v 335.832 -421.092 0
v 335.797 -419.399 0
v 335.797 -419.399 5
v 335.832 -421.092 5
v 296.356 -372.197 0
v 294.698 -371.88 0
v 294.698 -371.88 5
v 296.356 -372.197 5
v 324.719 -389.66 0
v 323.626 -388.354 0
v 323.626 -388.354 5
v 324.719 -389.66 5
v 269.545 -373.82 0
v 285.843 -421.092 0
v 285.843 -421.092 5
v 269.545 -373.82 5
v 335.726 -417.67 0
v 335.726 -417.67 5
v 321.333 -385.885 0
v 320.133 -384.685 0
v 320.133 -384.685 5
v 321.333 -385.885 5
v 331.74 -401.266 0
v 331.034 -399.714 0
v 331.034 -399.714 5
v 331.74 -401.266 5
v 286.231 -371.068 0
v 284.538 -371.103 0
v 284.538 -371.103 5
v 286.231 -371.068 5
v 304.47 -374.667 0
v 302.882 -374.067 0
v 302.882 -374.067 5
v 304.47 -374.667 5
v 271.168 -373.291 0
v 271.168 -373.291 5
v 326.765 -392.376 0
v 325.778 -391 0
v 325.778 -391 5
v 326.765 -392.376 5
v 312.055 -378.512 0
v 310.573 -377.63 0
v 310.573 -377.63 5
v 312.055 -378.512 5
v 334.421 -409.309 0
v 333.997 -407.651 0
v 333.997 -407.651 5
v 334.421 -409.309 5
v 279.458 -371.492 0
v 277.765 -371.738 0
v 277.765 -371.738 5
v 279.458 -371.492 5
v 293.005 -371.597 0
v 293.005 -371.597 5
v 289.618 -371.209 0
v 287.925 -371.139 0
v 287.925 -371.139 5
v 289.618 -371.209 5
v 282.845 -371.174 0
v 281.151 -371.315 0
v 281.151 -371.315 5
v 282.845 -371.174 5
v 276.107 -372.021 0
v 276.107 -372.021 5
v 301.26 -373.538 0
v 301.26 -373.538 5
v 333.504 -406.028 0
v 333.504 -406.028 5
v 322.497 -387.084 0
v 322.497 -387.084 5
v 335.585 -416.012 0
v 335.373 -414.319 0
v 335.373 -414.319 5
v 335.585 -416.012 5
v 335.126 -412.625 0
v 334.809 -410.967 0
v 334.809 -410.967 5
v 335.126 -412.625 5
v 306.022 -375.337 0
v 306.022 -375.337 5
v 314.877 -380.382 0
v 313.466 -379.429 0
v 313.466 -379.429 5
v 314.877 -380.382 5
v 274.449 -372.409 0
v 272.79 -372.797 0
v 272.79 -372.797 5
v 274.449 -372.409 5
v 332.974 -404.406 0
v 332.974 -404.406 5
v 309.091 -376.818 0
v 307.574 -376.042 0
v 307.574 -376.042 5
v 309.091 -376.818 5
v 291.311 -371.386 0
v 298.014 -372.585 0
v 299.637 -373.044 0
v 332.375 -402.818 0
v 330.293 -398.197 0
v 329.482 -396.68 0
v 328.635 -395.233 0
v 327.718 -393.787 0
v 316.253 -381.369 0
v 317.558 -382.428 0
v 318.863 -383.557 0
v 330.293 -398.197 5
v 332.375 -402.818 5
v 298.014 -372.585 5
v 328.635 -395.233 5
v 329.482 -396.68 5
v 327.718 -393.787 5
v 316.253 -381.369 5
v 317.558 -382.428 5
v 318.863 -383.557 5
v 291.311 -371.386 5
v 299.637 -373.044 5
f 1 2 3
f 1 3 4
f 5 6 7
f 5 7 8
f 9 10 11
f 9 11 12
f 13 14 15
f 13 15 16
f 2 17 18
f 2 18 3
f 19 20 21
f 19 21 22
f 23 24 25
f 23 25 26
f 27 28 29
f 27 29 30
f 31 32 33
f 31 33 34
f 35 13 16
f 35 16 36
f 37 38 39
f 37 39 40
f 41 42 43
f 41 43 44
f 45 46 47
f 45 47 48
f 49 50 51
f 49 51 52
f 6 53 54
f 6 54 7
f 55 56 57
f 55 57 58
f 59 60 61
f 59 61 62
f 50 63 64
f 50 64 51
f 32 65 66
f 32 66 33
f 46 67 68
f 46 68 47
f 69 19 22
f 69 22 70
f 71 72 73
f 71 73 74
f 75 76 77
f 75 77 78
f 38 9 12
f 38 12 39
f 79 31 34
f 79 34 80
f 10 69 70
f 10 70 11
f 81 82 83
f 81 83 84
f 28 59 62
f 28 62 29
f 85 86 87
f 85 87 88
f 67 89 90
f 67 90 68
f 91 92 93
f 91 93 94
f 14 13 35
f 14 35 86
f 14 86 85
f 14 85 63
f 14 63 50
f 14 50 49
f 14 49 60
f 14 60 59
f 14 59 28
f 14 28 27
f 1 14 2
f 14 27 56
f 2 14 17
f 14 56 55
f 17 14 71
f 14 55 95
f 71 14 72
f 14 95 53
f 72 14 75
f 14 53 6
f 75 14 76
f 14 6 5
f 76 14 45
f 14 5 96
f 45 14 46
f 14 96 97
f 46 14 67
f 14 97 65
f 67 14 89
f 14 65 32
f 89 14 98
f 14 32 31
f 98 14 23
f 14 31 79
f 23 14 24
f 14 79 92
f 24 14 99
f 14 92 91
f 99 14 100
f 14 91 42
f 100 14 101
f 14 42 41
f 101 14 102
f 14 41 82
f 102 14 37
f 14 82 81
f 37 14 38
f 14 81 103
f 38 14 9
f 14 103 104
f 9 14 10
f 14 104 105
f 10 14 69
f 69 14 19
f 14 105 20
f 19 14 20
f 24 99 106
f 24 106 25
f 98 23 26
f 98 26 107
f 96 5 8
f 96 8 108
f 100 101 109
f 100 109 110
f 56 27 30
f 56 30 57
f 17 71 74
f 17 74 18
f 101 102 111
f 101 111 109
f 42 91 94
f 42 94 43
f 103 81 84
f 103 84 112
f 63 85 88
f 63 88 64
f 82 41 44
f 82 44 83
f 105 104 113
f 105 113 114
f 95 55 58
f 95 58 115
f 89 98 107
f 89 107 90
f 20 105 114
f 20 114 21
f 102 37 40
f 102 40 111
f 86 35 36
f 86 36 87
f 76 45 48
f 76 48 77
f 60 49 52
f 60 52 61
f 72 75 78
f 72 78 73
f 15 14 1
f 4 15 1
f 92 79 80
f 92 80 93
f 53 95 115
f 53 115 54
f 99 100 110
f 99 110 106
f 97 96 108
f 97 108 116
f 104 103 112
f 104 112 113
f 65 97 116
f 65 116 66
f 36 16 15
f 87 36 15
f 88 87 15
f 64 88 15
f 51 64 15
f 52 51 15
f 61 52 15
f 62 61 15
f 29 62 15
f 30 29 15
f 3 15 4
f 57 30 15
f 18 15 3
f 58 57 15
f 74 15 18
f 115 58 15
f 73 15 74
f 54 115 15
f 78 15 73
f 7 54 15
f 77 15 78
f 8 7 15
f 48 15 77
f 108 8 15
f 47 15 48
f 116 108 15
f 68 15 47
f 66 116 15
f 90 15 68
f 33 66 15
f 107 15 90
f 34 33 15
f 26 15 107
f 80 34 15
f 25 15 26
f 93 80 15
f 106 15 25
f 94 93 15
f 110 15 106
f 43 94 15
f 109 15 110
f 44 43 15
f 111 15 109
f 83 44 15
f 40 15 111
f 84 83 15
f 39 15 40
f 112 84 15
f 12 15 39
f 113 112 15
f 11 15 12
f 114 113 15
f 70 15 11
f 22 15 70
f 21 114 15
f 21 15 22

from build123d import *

# Parameters (mm, degrees)
PAD_DEPTH = 5


with BuildPart() as part:
    # Sketch006 → Pad (new body)
    with BuildSketch(Plane.XY):
        with BuildLine():
            add(Edge.make_bspline(
                [(285.84324, -421.092099), (335.83185, -421.092099)],
                knots=[0, 0, 141.7, 141.7], degree=1))
            add(Edge.make_bspline(
                [(335.796573, -419.398766), (335.83185, -421.092099)],
                knots=[0, 0, 4.801042, 4.801042], degree=1))
            add(Edge.make_bspline(
                [(335.726017, -417.670155), (335.796573, -419.398766)],
                knots=[0, 0, 4.90408, 4.90408], degree=1))
            add(Edge.make_bspline(
                [(335.584906, -416.012099), (335.726017, -417.670155)],
                knots=[0, 0, 4.716991, 4.716991], degree=1))
            add(Edge.make_bspline(
                [(335.373239, -414.318766), (335.584906, -416.012099)],
                knots=[0, 0, 4.837355, 4.837355], degree=1))
            add(Edge.make_bspline(
                [(335.126295, -412.625433), (335.373239, -414.318766)],
                knots=[0, 0, 4.850773, 4.850773], degree=1))
            add(Edge.make_bspline(
                [(334.808795, -410.967377), (335.126295, -412.625433)],
                knots=[0, 0, 4.785394, 4.785394], degree=1))
            add(Edge.make_bspline(
                [(334.420739, -409.309322), (334.808795, -410.967377)],
                knots=[0, 0, 4.827007, 4.827007], degree=1))
            add(Edge.make_bspline(
                [(333.997406, -407.651266), (334.420739, -409.309322)],
                knots=[0, 0, 4.850773, 4.850773], degree=1))
            add(Edge.make_bspline(
                [(333.503517, -406.028489), (333.997406, -407.651266)],
                knots=[0, 0, 4.808326, 4.808326], degree=1))
            add(Edge.make_bspline(
                [(332.974351, -404.405711), (333.503517, -406.028489)],
                knots=[0, 0, 4.838388, 4.838388], degree=1))
            add(Edge.make_bspline(
                [(332.374628, -402.818211), (332.974351, -404.405711)],
                knots=[0, 0, 4.810405, 4.810405], degree=1))
            add(Edge.make_bspline(
                [(331.739628, -401.265989), (332.374628, -402.818211)],
                knots=[0, 0, 4.753946, 4.753946], degree=1))
            add(Edge.make_bspline(
                [(331.034073, -399.713766), (331.739628, -401.265989)],
                knots=[0, 0, 4.833218, 4.833218], degree=1))
            add(Edge.make_bspline(
                [(330.293239, -398.196822), (331.034073, -399.713766)],
                knots=[0, 0, 4.785394, 4.785394], degree=1))
            add(Edge.make_bspline(
                [(329.481851, -396.679878), (330.293239, -398.196822)],
                knots=[0, 0, 4.876474, 4.876474], degree=1))
            add(Edge.make_bspline(
                [(328.635184, -395.233489), (329.481851, -396.679878)],
                knots=[0, 0, 4.750789, 4.750789], degree=1))
            add(Edge.make_bspline(
                [(327.717962, -393.7871), (328.635184, -395.233489)],
                knots=[0, 0, 4.854894, 4.854894], degree=1))
            add(Edge.make_bspline(
                [(326.765462, -392.375989), (327.717962, -393.7871)],
                knots=[0, 0, 4.825971, 4.825971], degree=1))
            add(Edge.make_bspline(
                [(325.777684, -391.000156), (326.765462, -392.375989)],
                knots=[0, 0, 4.801042, 4.801042], degree=1))
            add(Edge.make_bspline(
                [(324.719351, -389.6596), (325.777684, -391.000156)],
                knots=[0, 0, 4.841487, 4.841487], degree=1))
            add(Edge.make_bspline(
                [(323.62574, -388.354322), (324.719351, -389.6596)],
                knots=[0, 0, 4.827007, 4.827007], degree=1))
            add(Edge.make_bspline(
                [(322.496851, -387.084322), (323.62574, -388.354322)],
                knots=[0, 0, 4.816638, 4.816638], degree=1))
            add(Edge.make_bspline(
                [(321.332684, -385.884878), (322.496851, -387.084322)],
                knots=[0, 0, 4.738143, 4.738143], degree=1))
            add(Edge.make_bspline(
                [(320.13324, -384.685433), (321.332684, -385.884878)],
                knots=[0, 0, 4.808326, 4.808326], degree=1))
            add(Edge.make_bspline(
                [(318.86324, -383.556545), (320.13324, -384.685433)],
                knots=[0, 0, 4.816638, 4.816638], degree=1))
            add(Edge.make_bspline(
                [(317.557962, -382.427656), (318.86324, -383.556545)],
                knots=[0, 0, 4.89183, 4.89183], degree=1))
            add(Edge.make_bspline(
                [(316.252684, -381.369322), (317.557962, -382.427656)],
                knots=[0, 0, 4.763402, 4.763402], degree=1))
            add(Edge.make_bspline(
                [(314.876851, -380.381545), (316.252684, -381.369322)],
                knots=[0, 0, 4.801042, 4.801042], degree=1))
            add(Edge.make_bspline(
                [(313.46574, -379.429045), (314.876851, -380.381545)],
                knots=[0, 0, 4.825971, 4.825971], degree=1))
            add(Edge.make_bspline(
                [(312.054629, -378.511822), (313.46574, -379.429045)],
                knots=[0, 0, 4.770744, 4.770744], degree=1))
            add(Edge.make_bspline(
                [(310.572962, -377.629878), (312.054629, -378.511822)],
                knots=[0, 0, 4.88774, 4.88774], degree=1))
            add(Edge.make_bspline(
                [(309.091295, -376.818489), (310.572962, -377.629878)],
                knots=[0, 0, 4.788528, 4.788528], degree=1))
            add(Edge.make_bspline(
                [(307.574351, -376.042378), (309.091295, -376.818489)],
                knots=[0, 0, 4.830114, 4.830114], degree=1))
            add(Edge.make_bspline(
                [(306.022129, -375.336823), (307.574351, -376.042378)],
                knots=[0, 0, 4.833218, 4.833218], degree=1))
            add(Edge.make_bspline(
                [(304.469907, -374.666545), (306.022129, -375.336823)],
                knots=[0, 0, 4.792703, 4.792703], degree=1))
            add(Edge.make_bspline(
                [(302.882407, -374.066823), (304.469907, -374.666545)],
                knots=[0, 0, 4.810405, 4.810405], degree=1))
            add(Edge.make_bspline(
                [(301.259629, -373.537656), (302.882407, -374.066823)],
                knots=[0, 0, 4.838388, 4.838388], degree=1))
            add(Edge.make_bspline(
                [(299.636851, -373.043767), (301.259629, -373.537656)],
                knots=[0, 0, 4.808326, 4.808326], degree=1))
            add(Edge.make_bspline(
                [(298.014074, -372.585156), (299.636851, -373.043767)],
                knots=[0, 0, 4.780167, 4.780167], degree=1))
            add(Edge.make_bspline(
                [(296.356018, -372.1971), (298.014074, -372.585156)],
                knots=[0, 0, 4.827007, 4.827007], degree=1))
            add(Edge.make_bspline(
                [(294.697962, -371.8796), (296.356018, -372.1971)],
                knots=[0, 0, 4.785394, 4.785394], degree=1))
            add(Edge.make_bspline(
                [(293.004629, -371.597378), (294.697962, -371.8796)],
                knots=[0, 0, 4.86621, 4.86621], degree=1))
            add(Edge.make_bspline(
                [(291.311296, -371.385712), (293.004629, -371.597378)],
                knots=[0, 0, 4.837355, 4.837355], degree=1))
            add(Edge.make_bspline(
                [(289.617963, -371.209323), (291.311296, -371.385712)],
                knots=[0, 0, 4.825971, 4.825971], degree=1))
            add(Edge.make_bspline(
                [(287.924629, -371.138767), (289.617963, -371.209323)],
                knots=[0, 0, 4.804165, 4.804165], degree=1))
            add(Edge.make_bspline(
                [(286.231296, -371.068212), (287.924629, -371.138767)],
                knots=[0, 0, 4.804165, 4.804165], degree=1))
            add(Edge.make_bspline(
                [(284.537963, -371.103489), (286.231296, -371.068212)],
                knots=[0, 0, 4.801042, 4.801042], degree=1))
            add(Edge.make_bspline(
                [(282.844629, -371.174045), (284.537963, -371.103489)],
                knots=[0, 0, 4.804165, 4.804165], degree=1))
            add(Edge.make_bspline(
                [(281.151296, -371.315156), (282.844629, -371.174045)],
                knots=[0, 0, 4.816638, 4.816638], degree=1))
            add(Edge.make_bspline(
                [(279.457963, -371.491545), (281.151296, -371.315156)],
                knots=[0, 0, 4.825971, 4.825971], degree=1))
            add(Edge.make_bspline(
                [(277.76463, -371.738489), (279.457963, -371.491545)],
                knots=[0, 0, 4.850773, 4.850773], degree=1))
            add(Edge.make_bspline(
                [(276.106574, -372.020711), (277.76463, -371.738489)],
                knots=[0, 0, 4.767599, 4.767599], degree=1))
            add(Edge.make_bspline(
                [(274.448518, -372.408767), (276.106574, -372.020711)],
                knots=[0, 0, 4.827007, 4.827007], degree=1))
            add(Edge.make_bspline(
                [(272.790463, -372.796823), (274.448518, -372.408767)],
                knots=[0, 0, 4.827007, 4.827007], degree=1))
            add(Edge.make_bspline(
                [(271.167685, -373.290711), (272.790463, -372.796823)],
                knots=[0, 0, 4.808326, 4.808326], degree=1))
            add(Edge.make_bspline(
                [(269.544907, -373.819878), (271.167685, -373.290711)],
                knots=[0, 0, 4.838388, 4.838388], degree=1))
            add(Edge.make_bspline(
                [(285.84324, -421.092099), (269.544907, -373.819878)],
                knots=[0, 0, 141.740749, 141.740749], degree=1))
        make_face()
    extrude(amount=PAD_DEPTH)


solid = part.part
